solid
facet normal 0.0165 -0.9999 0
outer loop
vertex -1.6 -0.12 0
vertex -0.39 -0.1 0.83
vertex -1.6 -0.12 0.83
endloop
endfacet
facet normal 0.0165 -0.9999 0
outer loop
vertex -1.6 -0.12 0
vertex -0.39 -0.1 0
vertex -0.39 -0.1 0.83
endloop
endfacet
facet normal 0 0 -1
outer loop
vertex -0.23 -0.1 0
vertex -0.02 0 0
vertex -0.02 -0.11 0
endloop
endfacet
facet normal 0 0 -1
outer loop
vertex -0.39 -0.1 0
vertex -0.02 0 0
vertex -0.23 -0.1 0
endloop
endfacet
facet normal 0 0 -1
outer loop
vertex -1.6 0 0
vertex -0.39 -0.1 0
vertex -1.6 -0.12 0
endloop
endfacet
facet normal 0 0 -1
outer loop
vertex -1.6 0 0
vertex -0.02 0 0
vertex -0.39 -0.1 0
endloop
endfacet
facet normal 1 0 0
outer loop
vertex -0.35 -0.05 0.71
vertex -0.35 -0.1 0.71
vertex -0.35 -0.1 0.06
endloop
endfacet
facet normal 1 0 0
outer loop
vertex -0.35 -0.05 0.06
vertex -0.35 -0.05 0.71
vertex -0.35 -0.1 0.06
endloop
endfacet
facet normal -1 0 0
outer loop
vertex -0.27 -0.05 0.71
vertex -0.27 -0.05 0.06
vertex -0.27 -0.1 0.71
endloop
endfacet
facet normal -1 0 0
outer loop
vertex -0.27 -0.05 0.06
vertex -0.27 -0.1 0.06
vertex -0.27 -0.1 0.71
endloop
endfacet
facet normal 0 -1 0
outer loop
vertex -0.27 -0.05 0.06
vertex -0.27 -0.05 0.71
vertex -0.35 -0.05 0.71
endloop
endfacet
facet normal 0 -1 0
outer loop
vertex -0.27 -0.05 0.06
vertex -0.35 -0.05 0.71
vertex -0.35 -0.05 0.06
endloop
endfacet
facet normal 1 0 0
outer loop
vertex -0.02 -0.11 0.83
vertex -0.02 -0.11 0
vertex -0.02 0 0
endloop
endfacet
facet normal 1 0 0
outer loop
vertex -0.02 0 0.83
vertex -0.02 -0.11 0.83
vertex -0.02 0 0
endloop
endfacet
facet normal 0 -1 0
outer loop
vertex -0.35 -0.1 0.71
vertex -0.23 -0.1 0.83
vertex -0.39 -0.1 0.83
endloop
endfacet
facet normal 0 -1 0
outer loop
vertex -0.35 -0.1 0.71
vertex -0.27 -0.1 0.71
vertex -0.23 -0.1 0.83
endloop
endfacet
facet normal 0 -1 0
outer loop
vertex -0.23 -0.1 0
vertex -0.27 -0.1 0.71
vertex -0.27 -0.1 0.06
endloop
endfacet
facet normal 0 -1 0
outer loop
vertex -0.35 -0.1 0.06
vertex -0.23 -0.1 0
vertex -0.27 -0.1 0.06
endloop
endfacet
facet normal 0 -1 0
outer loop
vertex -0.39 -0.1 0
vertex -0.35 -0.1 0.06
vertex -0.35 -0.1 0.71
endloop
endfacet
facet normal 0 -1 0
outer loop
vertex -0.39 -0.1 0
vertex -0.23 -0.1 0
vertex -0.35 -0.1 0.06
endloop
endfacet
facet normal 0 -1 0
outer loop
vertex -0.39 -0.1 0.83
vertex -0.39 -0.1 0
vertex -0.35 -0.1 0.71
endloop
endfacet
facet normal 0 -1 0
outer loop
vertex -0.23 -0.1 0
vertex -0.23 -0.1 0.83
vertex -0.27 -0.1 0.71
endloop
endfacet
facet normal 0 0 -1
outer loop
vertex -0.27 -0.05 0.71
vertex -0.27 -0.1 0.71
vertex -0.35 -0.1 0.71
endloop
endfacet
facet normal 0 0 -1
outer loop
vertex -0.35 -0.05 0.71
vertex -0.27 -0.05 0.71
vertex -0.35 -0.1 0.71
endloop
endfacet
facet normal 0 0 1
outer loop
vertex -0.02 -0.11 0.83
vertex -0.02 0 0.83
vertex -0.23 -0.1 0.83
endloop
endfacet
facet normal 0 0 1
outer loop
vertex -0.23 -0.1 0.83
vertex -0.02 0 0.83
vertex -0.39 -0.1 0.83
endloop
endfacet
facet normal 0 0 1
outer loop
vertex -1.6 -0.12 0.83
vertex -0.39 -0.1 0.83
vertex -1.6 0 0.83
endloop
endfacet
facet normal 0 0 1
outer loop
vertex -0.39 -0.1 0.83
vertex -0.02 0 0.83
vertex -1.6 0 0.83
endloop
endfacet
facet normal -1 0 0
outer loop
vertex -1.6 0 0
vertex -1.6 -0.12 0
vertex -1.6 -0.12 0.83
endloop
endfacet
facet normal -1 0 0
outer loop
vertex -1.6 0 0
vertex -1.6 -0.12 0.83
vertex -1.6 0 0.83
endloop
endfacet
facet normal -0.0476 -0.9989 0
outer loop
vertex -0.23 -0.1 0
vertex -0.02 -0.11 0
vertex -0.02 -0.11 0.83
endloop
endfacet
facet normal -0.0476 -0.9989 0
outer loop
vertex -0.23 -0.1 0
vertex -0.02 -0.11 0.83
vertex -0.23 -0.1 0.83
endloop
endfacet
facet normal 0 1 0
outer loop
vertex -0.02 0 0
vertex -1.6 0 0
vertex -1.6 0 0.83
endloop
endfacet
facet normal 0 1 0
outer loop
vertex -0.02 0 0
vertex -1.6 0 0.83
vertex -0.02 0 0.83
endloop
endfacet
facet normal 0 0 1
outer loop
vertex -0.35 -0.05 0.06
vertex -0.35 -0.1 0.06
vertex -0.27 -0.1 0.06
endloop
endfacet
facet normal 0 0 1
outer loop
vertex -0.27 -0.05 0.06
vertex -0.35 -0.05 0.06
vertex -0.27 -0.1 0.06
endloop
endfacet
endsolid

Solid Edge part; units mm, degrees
sketch "Sketch1" plane through (0, 0, 0) normal (0, 0, 1) x (1, 0, 0)
  line L0 (-1.6, 0) -> (-0.02, 0)
  line L1 (-0.02, -0.11) -> (-0.02, 0)
  line L2 (-0.02, -0.11) -> (-0.23, -0.1)
  line L3 (-0.23, -0.1) -> (-0.39, -0.1)
  line L4 (-0.39, -0.1) -> (-1.6, -0.12)
  line L5 (-1.6, -0.12) -> (-1.6, 0)
  dimension "D1" = 0.02
  dimension "D2" = 1.6
  dimension "D3" = 1.6
  dimension "D4" = 0.23
extrude "Protrusion1" add sketch "Sketch1" along normal blind 0.83
sketch "Sketch2" plane through (-0.31, -0.1, 0.415) normal (0, -1, 0) x (0, 0, -1)
  line L0 (-0.295, -0.04) -> (0.355, -0.04)
  line L1 (0.355, -0.04) -> (0.355, 0.04)
  line L2 (0.355, 0.04) -> (-0.295, 0.04)
  line L3 (-0.295, 0.04) -> (-0.295, -0.04)
  dimension "D1" = 0.295
  dimension "D2" = 0.355
extrude "Ausschnitt_1" cut sketch "Sketch2" against normal blind 0.05
